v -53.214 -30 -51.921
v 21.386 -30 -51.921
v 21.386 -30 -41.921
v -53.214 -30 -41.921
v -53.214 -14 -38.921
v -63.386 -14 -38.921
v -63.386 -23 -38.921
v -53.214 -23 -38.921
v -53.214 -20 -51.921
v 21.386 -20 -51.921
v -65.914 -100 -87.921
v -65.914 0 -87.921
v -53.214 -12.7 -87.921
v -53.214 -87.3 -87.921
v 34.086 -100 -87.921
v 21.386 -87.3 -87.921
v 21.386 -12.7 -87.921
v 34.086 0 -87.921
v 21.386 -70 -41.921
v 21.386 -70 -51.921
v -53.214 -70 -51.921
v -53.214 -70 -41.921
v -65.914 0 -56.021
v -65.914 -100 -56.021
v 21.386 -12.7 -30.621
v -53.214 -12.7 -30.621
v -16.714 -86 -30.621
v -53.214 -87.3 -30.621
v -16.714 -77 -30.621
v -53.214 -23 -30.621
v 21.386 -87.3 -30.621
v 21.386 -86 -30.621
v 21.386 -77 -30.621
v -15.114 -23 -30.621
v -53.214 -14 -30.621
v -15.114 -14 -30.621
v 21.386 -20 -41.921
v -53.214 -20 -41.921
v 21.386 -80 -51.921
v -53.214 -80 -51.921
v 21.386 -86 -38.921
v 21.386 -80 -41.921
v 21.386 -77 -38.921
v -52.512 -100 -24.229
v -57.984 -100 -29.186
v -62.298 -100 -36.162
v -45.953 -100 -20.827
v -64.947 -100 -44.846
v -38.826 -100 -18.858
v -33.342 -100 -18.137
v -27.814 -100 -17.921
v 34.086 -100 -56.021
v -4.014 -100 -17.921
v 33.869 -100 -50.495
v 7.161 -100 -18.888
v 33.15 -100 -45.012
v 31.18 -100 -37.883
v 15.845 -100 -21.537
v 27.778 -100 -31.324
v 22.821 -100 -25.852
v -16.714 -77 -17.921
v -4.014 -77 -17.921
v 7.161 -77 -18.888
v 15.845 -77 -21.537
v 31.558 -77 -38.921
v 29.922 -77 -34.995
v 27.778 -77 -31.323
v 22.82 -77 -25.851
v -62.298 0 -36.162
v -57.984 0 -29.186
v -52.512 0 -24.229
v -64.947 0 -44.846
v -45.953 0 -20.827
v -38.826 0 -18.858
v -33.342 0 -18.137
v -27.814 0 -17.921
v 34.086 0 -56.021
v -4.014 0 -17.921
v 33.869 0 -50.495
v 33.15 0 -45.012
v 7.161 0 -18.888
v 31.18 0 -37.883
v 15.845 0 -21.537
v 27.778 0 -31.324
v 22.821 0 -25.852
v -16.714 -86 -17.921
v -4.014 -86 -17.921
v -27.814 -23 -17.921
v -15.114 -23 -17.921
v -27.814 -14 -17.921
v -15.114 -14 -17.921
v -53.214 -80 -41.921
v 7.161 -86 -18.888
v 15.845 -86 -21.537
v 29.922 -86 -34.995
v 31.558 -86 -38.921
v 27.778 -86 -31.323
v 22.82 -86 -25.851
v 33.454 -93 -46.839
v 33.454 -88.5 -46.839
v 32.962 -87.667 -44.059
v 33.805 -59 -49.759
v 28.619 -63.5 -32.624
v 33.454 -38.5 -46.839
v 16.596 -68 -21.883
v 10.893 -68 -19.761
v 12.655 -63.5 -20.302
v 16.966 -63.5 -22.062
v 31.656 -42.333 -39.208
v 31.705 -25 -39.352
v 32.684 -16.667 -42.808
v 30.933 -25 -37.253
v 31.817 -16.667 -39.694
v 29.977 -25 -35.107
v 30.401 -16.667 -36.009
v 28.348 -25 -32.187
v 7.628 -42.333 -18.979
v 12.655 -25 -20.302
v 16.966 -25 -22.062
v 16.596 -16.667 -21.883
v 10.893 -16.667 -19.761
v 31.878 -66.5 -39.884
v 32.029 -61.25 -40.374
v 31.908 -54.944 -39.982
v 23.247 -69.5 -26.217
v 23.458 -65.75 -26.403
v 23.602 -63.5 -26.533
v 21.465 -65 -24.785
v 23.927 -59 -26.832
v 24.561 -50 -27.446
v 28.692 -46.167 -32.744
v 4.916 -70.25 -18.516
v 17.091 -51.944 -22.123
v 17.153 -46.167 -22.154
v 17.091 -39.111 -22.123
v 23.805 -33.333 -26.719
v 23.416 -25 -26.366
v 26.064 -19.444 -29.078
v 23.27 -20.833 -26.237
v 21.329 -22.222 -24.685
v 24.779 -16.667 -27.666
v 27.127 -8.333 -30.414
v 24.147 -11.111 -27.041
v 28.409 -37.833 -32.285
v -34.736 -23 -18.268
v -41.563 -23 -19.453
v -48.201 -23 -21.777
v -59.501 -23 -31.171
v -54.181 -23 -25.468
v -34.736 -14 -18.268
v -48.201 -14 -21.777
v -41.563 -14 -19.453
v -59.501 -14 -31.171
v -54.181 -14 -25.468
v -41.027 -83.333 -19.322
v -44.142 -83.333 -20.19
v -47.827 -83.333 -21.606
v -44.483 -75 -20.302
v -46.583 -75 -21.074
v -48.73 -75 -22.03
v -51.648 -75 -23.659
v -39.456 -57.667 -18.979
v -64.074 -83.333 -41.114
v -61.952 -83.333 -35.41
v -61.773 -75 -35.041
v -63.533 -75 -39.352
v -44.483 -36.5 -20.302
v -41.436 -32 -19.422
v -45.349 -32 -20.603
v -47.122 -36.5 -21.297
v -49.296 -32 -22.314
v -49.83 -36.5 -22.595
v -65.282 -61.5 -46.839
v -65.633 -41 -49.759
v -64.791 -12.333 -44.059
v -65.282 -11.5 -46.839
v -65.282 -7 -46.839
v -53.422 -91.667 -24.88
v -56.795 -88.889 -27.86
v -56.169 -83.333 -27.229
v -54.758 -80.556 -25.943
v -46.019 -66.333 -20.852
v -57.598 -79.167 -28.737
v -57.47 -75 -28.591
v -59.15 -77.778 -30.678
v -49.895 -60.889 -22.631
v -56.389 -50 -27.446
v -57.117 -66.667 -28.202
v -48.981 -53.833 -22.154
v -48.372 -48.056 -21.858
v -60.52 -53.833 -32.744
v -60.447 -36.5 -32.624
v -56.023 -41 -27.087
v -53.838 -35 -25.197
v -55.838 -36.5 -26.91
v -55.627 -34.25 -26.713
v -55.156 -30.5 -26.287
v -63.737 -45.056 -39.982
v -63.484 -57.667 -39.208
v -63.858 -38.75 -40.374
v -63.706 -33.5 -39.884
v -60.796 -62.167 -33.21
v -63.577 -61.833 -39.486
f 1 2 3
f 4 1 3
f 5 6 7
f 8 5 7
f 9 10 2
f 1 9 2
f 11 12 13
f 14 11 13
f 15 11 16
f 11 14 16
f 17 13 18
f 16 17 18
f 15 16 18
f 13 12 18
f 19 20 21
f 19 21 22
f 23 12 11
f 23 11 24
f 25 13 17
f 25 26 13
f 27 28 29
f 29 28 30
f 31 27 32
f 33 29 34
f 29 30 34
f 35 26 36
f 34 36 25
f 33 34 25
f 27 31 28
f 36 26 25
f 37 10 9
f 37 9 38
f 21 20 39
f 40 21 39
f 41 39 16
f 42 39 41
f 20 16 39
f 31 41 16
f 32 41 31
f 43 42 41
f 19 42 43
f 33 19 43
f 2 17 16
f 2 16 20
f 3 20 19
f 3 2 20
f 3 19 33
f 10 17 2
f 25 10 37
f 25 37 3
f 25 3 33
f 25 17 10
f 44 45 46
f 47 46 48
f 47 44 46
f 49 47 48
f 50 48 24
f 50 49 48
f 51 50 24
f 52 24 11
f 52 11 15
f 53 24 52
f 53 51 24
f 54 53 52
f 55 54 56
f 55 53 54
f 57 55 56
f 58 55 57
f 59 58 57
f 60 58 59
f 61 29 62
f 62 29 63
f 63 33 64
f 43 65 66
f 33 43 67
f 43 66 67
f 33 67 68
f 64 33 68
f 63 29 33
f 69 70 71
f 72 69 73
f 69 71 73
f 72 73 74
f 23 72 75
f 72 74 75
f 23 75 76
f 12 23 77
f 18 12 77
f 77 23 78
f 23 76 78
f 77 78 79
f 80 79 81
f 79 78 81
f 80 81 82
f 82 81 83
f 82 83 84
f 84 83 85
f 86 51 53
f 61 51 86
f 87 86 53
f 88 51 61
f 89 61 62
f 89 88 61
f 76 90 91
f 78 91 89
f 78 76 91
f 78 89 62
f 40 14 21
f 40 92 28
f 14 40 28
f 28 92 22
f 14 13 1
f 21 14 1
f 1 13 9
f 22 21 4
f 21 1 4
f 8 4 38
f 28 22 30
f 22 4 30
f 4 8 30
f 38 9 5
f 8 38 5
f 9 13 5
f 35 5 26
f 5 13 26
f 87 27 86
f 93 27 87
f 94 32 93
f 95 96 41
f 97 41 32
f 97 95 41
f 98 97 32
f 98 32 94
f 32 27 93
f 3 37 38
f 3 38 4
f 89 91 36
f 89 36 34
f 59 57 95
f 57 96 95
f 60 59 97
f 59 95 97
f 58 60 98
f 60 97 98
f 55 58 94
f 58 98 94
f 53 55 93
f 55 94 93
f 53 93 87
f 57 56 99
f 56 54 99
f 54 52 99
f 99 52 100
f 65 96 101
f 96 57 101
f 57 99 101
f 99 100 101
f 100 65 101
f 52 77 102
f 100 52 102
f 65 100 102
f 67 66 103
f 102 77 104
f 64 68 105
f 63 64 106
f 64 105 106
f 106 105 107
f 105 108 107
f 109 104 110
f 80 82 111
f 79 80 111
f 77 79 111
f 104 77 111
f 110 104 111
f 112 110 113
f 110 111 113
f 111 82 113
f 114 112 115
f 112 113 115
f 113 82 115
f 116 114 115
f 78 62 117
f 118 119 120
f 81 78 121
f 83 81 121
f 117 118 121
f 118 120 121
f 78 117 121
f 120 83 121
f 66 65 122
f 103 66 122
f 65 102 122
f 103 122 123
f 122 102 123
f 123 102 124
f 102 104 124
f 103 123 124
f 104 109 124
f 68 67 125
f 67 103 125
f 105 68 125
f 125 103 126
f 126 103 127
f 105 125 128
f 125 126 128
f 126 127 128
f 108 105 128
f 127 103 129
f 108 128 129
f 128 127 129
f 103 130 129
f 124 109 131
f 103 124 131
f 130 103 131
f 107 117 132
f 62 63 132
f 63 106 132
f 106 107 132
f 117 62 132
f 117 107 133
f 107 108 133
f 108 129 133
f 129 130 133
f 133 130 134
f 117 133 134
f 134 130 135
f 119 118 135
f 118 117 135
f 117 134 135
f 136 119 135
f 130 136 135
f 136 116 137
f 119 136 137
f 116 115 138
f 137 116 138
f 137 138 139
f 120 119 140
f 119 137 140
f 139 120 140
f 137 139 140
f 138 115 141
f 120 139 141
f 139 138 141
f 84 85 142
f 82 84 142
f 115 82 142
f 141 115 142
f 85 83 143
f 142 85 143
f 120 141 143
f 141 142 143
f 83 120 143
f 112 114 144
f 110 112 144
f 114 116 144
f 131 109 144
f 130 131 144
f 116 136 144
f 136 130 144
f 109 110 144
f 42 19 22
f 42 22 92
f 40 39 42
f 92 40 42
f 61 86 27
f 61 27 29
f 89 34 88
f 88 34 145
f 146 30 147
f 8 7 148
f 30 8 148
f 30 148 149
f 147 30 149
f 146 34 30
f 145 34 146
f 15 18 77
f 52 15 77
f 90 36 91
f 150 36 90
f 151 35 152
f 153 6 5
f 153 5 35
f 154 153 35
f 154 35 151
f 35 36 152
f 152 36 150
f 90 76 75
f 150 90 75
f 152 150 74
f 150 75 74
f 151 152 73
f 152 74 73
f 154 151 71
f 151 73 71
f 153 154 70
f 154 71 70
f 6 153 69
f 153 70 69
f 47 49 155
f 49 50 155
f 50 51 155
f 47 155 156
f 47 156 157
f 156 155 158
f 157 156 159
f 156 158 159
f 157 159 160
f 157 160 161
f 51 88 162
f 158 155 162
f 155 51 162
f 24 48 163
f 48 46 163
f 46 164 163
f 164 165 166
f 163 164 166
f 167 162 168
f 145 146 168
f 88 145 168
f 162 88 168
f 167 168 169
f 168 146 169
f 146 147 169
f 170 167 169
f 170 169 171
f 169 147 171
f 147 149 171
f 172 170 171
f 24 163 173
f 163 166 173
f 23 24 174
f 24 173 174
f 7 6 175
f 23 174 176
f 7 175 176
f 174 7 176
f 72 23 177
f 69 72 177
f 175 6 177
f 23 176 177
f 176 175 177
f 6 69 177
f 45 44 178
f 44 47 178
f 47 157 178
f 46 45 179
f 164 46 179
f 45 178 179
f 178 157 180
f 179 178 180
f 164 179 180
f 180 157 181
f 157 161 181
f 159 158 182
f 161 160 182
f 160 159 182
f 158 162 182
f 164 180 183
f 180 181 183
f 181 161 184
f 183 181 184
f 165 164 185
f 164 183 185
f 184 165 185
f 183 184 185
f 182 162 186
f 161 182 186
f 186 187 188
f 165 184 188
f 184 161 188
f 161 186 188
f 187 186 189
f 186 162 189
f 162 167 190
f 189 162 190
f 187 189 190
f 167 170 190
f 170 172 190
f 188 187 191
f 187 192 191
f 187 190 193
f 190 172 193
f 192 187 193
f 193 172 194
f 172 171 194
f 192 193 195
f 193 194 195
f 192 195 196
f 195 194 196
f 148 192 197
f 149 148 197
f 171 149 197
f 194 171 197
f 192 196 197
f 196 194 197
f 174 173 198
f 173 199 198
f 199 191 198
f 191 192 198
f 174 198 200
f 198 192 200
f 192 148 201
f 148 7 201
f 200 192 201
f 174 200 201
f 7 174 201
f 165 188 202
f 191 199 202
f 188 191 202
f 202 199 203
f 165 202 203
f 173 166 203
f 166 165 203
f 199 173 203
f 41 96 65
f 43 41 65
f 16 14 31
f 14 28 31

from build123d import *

# Parameters (mm, degrees)
F0_W        = 100
F0_H        = 70
F1_DEPTH    = 100
F2_T        = -12.7
F3_T1_DEPTH = 290.5
F4_T1_DEPTH = 290.5
F5_W        = 9
F5_H        = 32
F6_DEPTH    = 50.8
F7_W        = 9
F7_H        = 30
F8_DEPTH    = 50.8
F9_W        = 10
F9_H        = 10
F10_DEPTH   = 83.82


# Not quite as in the source:
# - a fillet or chamfer that OpenCascade refuses, or shapes differently, is made with other operations: its cross-section is extruded or revolved along the edge and cut away or added


with BuildPart() as f1:
    # F0 (on Front) → F1 (new body)
    with BuildSketch(Plane.XZ):
        with Locations((-15.9141167998, -52.9208671927)):
            Rectangle(F0_W, F0_H)
    extrude(amount=F1_DEPTH)

    # F2
    f2_openings = [f1.faces().sort_by_distance(p)[0] for p in [
        (-15.914117, -50, -87.920867),
    ]]
    offset(amount=F2_T, openings=f2_openings)

    # F3: fillet of radius 38.1 on 1 edges, made by hand

    # F3_s2 → F3_t1 (cut)
    with BuildSketch(Plane.XZ.offset(-95.25)):
        with BuildLine():
            add(Edge.make_bspline(
                [(34.0858832002, -56.0208671927), (34.0858832002, -17.9208671927), (-4.0141167998, -17.9208671927)],
                knots=[0, 0, 0, 1, 1, 1], degree=2, weights=[1, 1, 1]))
            Line((-4.0141167998, -17.9208671927), (34.0858832002, -17.9208671927))
            Line((34.0858832002, -17.9208671927), (34.0858832002, -56.0208671927))
        make_face()
    extrude(amount=F3_T1_DEPTH, mode=Mode.SUBTRACT)

    # F4: fillet of radius 38.1 on 1 edges, made by hand

    # F4_s2 → F4_t1 (cut)
    with BuildSketch(Plane.XZ.offset(-95.25)):
        with BuildLine():
            add(Edge.make_bspline(
                [(-27.8141167998, -17.9208671927), (-65.9141167998, -17.9208671927), (-65.9141167998, -56.0208671927)],
                knots=[0, 0, 0, 1, 1, 1], degree=2, weights=[1, 1, 1]))
            Line((-65.9141167998, -56.0208671927), (-65.9141167998, -17.9208671927))
            Line((-65.9141167998, -17.9208671927), (-27.8141167998, -17.9208671927))
        make_face()
    extrude(amount=F4_T1_DEPTH, mode=Mode.SUBTRACT)

    # F5 (on face) → F6 (cut)
    with BuildSketch(Plane(origin=(-65.9141167998, 0, 0), x_dir=(0, -1, 0), z_dir=(-1, 0, 0))):
        with Locations((18.5, -22.9208671927)):
            Rectangle(F5_W, F5_H)
    extrude(amount=-F6_DEPTH, mode=Mode.SUBTRACT)

    # F7 (on face) → F8 (cut)
    with BuildSketch(Plane.YZ.offset(34.0858832002)):
        with Locations((-81.5, -23.9208671927)):
            Rectangle(F7_W, F7_H)
    extrude(amount=-F8_DEPTH, mode=Mode.SUBTRACT)

    # F9 (on face) → F10 (join)
    with BuildSketch(Plane(origin=(21.3858832002, 0, 0), x_dir=(0, -1, 0), z_dir=(-1, 0, 0))):
        with Locations((25, -46.9208671927)):
            Rectangle(F9_W, F9_H)
        with Locations((75, -46.9208671927)):
            Rectangle(F9_W, F9_H)
    extrude(amount=F10_DEPTH)


solid = f1.part
